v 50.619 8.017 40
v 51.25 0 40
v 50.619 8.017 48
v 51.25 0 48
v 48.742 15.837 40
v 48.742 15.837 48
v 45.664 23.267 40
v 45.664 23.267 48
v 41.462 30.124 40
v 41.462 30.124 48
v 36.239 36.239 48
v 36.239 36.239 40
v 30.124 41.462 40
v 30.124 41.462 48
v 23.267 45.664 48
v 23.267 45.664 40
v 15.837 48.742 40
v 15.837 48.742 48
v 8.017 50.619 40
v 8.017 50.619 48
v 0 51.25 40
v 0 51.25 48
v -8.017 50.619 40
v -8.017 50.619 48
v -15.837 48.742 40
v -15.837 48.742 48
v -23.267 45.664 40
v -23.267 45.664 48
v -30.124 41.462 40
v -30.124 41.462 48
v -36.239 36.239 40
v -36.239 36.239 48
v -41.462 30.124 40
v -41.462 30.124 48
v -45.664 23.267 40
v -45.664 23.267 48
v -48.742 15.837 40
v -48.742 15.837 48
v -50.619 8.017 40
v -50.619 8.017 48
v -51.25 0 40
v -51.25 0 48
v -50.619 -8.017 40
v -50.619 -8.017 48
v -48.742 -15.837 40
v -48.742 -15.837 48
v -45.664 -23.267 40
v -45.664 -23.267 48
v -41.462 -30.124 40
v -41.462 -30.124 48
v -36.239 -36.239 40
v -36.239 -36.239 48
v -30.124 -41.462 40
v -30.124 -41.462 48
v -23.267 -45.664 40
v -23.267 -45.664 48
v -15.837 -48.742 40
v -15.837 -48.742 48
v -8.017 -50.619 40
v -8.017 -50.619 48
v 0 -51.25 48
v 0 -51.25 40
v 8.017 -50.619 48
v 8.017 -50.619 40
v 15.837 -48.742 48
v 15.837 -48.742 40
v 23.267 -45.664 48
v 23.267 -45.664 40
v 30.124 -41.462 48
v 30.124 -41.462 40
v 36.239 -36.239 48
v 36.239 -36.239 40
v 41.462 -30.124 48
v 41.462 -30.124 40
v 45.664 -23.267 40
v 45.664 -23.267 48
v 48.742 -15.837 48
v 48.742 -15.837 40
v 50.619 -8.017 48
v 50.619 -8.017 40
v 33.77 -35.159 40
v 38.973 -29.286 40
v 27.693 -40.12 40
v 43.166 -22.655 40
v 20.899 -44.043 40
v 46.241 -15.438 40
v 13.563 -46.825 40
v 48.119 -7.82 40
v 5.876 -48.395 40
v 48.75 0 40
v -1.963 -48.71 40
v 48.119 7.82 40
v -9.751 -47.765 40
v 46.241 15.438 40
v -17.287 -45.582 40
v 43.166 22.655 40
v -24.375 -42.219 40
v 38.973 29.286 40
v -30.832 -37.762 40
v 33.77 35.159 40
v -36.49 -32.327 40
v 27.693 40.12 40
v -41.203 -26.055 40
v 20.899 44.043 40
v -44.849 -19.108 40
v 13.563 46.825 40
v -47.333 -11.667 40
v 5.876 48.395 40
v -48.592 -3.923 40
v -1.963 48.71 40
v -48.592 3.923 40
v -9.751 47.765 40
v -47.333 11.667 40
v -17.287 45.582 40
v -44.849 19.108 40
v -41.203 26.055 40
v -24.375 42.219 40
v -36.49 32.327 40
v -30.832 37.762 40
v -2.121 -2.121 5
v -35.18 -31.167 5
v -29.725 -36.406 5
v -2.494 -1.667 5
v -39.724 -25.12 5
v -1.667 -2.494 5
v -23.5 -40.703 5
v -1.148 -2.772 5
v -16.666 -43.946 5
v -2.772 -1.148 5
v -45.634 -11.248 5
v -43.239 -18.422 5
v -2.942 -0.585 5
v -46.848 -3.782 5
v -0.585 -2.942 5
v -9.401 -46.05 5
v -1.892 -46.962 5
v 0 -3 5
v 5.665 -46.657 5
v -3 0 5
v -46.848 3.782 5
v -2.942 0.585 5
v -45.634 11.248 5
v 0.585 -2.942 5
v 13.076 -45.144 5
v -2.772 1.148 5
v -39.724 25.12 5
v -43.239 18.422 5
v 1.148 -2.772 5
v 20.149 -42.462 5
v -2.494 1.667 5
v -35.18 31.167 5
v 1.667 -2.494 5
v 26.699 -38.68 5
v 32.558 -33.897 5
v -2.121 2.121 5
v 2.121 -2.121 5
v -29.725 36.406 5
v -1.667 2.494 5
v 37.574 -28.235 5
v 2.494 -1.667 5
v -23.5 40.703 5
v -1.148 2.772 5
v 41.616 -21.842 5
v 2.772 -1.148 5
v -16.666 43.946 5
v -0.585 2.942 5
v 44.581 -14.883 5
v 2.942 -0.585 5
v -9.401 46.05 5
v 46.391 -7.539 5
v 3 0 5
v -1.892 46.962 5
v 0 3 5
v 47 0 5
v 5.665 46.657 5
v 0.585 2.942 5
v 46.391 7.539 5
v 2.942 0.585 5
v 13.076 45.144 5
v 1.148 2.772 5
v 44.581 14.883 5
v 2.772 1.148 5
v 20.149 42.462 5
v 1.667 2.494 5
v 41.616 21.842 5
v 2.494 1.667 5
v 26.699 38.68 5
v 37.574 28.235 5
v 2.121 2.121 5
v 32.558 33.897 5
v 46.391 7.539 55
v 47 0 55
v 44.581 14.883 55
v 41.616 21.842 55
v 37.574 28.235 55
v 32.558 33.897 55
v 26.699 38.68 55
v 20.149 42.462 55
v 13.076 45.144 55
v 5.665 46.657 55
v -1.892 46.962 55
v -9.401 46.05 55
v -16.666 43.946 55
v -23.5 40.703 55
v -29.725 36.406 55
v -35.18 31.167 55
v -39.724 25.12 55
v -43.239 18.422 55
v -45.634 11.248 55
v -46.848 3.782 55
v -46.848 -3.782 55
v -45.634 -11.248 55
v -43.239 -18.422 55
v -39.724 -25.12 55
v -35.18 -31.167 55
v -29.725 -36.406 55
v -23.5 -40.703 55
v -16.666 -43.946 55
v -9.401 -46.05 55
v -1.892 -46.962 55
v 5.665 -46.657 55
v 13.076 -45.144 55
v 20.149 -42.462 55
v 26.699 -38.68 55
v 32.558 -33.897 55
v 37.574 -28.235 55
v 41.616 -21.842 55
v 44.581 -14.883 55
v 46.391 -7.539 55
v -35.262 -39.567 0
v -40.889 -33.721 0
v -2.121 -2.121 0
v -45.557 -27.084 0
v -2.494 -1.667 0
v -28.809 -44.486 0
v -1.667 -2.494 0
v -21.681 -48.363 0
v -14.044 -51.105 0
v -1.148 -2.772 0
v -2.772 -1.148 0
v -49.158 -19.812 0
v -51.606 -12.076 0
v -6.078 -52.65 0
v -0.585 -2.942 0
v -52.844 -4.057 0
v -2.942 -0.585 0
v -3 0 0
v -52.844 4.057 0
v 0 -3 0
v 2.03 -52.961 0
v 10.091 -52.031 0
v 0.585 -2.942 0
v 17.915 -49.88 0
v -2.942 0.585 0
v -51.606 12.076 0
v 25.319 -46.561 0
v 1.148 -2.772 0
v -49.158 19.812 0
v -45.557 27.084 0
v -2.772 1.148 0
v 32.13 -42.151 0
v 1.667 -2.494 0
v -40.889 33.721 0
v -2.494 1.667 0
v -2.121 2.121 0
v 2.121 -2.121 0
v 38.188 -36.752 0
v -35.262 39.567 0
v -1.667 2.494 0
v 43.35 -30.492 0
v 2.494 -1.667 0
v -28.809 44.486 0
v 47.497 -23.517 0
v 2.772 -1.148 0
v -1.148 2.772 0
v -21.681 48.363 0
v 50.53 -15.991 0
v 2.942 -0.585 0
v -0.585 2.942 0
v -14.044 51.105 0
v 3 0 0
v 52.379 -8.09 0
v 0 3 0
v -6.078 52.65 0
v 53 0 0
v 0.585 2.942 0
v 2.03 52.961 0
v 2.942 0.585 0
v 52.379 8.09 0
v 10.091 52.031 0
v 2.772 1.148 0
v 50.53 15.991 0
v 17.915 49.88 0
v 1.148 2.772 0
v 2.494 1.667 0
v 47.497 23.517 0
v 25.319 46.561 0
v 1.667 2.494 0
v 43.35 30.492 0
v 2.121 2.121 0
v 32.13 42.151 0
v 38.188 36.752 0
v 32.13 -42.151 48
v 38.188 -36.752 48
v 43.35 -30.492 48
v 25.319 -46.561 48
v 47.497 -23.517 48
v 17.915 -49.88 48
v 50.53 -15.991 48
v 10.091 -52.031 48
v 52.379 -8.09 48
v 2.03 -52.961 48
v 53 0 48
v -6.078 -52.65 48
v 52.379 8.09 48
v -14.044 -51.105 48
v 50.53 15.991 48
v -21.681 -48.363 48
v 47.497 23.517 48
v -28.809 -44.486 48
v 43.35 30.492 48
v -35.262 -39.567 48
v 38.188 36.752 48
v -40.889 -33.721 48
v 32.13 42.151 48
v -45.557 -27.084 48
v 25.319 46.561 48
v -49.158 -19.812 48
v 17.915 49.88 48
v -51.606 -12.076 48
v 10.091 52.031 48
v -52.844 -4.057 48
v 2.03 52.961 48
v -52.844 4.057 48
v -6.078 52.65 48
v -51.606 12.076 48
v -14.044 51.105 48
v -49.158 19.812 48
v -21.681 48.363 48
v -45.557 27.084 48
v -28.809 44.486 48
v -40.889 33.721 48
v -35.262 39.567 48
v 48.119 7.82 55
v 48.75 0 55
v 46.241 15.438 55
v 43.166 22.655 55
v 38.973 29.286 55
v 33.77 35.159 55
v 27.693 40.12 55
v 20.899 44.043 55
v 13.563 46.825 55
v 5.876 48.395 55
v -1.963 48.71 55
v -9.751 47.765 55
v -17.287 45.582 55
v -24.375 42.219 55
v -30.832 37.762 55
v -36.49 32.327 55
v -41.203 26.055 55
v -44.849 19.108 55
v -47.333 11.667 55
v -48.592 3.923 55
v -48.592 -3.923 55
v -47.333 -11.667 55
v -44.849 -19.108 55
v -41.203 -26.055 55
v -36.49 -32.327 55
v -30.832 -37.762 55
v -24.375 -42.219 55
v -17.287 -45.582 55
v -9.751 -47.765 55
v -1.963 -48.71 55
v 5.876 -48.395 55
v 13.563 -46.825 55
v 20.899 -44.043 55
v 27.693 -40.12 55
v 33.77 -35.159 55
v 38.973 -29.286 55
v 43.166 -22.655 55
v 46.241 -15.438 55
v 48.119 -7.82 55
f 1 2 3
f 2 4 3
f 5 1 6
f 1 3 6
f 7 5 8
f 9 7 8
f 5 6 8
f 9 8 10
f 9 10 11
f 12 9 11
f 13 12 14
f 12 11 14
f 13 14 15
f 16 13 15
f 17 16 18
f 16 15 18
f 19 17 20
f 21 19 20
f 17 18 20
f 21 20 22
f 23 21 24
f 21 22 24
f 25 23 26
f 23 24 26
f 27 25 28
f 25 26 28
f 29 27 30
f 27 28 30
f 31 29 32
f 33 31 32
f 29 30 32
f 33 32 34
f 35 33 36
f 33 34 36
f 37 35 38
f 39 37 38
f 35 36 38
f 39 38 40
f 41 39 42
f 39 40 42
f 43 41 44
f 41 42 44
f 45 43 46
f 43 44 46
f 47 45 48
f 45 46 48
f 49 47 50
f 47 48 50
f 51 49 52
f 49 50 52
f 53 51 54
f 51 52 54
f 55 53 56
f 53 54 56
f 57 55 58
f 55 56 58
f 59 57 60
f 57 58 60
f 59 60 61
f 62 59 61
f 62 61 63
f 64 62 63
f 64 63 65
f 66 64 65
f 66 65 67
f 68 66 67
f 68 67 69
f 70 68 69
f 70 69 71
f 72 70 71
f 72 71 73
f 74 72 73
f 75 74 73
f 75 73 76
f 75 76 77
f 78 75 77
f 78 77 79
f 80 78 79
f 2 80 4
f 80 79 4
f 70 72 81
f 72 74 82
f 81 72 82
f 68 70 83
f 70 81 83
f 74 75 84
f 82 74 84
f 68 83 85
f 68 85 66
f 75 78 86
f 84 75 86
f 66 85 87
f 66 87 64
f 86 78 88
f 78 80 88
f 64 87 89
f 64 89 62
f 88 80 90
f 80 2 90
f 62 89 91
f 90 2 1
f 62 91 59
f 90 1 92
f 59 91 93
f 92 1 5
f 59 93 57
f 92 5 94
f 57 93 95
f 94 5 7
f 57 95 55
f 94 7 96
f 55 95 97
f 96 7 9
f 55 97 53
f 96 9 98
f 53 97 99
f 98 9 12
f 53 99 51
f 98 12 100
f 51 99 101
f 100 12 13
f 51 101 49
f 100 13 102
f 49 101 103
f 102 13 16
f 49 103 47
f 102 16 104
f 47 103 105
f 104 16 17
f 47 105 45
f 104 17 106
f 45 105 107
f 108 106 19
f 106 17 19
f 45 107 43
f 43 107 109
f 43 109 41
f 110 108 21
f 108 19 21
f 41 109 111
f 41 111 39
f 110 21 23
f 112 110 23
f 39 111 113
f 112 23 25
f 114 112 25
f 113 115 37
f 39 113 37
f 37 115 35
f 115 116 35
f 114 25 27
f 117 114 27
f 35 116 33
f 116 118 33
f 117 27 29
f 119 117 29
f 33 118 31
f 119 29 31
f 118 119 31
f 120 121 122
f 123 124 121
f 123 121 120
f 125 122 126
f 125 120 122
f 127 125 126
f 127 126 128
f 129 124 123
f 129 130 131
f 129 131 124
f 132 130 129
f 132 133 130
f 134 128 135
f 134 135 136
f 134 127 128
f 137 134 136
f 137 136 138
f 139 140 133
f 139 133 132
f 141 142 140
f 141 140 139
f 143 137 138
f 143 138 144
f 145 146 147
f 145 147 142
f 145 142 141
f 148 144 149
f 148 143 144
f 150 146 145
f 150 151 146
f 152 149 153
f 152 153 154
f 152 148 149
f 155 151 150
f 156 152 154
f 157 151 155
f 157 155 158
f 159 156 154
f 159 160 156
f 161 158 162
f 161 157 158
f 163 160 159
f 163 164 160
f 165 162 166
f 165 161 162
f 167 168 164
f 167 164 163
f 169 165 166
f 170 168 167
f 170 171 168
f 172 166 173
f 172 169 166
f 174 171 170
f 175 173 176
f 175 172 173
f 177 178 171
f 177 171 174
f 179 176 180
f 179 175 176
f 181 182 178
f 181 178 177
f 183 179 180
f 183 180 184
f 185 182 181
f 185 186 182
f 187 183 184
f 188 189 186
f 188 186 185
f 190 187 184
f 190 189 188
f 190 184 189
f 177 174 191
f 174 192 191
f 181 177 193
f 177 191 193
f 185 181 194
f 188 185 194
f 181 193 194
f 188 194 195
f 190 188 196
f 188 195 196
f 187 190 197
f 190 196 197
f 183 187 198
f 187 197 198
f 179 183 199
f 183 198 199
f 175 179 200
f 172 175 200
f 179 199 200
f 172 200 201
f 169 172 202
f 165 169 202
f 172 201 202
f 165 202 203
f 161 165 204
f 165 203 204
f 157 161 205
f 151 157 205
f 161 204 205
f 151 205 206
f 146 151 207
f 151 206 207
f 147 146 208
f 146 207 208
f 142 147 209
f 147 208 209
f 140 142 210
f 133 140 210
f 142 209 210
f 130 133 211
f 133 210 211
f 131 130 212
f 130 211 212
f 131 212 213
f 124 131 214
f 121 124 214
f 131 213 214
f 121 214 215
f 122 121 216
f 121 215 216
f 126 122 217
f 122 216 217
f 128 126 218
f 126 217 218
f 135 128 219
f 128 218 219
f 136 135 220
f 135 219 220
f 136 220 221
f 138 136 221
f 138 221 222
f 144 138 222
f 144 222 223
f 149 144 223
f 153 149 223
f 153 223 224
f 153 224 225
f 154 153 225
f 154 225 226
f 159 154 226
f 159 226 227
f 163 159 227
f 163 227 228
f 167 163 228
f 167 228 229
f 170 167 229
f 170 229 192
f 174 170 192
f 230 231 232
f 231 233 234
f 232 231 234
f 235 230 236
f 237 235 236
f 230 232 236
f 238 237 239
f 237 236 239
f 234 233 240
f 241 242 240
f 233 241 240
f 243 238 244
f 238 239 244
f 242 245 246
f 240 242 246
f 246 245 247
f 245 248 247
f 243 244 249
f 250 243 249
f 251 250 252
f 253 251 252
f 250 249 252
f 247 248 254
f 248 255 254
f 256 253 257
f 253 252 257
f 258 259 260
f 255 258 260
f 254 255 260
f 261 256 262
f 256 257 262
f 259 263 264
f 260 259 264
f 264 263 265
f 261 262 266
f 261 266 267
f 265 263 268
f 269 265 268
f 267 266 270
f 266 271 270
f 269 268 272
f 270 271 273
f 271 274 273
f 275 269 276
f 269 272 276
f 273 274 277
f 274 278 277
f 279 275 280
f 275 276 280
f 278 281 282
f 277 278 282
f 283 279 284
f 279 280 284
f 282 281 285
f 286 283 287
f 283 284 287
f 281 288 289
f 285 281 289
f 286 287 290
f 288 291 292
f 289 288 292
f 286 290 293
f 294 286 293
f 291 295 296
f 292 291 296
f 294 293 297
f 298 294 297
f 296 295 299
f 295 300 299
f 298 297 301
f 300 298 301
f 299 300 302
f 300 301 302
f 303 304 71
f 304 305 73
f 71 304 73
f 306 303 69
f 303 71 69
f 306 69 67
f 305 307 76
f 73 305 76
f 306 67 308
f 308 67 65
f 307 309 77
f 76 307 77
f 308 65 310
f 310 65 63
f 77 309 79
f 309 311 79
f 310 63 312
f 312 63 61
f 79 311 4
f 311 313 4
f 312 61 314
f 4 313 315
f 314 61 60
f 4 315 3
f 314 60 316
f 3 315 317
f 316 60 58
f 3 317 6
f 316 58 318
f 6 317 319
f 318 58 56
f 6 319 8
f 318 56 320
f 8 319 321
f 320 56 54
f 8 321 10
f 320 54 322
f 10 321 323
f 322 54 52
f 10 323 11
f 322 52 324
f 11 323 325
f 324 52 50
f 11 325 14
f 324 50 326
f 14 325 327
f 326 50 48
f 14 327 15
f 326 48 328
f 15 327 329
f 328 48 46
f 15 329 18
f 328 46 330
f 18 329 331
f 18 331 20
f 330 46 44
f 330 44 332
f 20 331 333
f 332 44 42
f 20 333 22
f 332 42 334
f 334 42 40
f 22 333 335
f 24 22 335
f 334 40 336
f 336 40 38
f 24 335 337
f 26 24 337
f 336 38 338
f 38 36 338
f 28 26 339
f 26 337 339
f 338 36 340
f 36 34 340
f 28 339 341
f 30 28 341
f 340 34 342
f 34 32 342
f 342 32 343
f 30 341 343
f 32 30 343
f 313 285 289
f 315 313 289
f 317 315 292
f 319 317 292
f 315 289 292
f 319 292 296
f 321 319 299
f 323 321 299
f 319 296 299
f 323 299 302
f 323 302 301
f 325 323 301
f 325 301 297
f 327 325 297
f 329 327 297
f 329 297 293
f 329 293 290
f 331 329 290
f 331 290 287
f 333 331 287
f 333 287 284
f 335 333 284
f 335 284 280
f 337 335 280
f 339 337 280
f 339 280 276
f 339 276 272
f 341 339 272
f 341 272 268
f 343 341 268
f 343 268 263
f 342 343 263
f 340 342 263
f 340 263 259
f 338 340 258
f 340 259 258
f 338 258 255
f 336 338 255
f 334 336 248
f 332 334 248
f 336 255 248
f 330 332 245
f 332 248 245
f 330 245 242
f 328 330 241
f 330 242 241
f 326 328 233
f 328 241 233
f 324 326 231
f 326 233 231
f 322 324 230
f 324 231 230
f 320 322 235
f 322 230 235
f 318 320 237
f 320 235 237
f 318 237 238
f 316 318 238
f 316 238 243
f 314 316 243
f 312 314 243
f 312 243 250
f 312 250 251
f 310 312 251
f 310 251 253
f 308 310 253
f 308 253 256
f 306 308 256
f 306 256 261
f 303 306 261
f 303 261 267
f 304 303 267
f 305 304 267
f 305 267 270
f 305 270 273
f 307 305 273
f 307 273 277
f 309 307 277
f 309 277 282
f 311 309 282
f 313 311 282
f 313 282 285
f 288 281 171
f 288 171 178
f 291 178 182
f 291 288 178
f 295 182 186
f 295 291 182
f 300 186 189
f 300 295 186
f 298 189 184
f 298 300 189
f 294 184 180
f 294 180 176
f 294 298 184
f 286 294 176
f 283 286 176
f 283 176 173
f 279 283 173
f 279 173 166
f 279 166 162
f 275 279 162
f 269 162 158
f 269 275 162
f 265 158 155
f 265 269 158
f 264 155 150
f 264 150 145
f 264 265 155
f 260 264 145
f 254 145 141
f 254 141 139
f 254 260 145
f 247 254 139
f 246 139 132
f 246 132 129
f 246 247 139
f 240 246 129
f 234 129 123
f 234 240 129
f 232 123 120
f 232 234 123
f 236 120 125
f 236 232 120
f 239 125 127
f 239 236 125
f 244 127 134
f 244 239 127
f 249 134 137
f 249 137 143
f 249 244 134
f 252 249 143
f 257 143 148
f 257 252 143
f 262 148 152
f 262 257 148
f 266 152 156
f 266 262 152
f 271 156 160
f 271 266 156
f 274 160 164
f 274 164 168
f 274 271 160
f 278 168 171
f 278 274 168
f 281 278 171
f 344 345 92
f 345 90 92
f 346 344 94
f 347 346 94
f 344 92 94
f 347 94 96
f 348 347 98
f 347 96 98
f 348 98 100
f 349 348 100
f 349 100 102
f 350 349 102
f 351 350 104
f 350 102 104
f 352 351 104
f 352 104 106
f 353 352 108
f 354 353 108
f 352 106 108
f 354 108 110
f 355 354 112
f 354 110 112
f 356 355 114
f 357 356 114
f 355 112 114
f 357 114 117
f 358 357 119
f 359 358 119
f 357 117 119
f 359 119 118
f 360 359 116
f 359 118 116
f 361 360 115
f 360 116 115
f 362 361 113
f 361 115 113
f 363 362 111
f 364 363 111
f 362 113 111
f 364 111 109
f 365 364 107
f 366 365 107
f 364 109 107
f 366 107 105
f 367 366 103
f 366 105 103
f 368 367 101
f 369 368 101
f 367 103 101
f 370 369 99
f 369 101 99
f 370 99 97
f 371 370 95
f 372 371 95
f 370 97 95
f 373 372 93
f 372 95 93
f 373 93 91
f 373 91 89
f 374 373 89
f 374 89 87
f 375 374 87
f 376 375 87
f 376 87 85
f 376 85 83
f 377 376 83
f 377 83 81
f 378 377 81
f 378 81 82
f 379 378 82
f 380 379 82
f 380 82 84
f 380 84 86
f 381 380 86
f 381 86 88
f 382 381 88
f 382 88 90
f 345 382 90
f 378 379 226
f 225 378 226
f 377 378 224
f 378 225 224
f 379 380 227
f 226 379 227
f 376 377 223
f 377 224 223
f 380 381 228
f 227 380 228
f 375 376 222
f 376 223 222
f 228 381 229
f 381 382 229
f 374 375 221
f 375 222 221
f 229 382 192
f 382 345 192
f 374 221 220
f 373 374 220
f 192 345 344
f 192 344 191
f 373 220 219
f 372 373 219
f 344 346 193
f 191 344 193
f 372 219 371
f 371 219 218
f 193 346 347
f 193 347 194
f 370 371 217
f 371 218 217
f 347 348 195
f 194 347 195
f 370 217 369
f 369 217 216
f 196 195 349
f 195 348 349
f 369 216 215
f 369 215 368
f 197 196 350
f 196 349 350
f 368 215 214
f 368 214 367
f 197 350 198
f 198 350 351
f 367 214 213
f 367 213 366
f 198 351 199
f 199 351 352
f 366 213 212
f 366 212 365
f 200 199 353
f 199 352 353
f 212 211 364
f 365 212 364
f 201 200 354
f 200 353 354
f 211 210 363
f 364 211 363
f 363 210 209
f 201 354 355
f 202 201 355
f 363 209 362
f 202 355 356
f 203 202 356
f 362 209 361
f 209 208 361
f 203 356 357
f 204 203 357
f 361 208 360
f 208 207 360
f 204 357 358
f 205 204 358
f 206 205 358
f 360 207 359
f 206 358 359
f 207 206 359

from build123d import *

# Parameters (mm, degrees)
SKETCH_R   = 53
SKETCH_R_2 = 3
PAD_DEPTH  = 5


with BuildPart() as part:
    # Sketch → Pad (new body)
    with BuildSketch(Plane.XY):
        Circle(SKETCH_R)
        Circle(SKETCH_R_2, mode=Mode.SUBTRACT)
    extrude(amount=PAD_DEPTH)

    # Sketch001 → Revolution (revolve)
    with BuildSketch(Plane.XZ):
        Polygon((53, 5), (47, 5), (47, 55), (48.75, 55), (48.75, 40), (51.25, 40), (51.25, 48), (53, 48), align=None)
    revolve(axis=Axis((0, 0, 0), (0, 0, 1)))


solid = part.part
